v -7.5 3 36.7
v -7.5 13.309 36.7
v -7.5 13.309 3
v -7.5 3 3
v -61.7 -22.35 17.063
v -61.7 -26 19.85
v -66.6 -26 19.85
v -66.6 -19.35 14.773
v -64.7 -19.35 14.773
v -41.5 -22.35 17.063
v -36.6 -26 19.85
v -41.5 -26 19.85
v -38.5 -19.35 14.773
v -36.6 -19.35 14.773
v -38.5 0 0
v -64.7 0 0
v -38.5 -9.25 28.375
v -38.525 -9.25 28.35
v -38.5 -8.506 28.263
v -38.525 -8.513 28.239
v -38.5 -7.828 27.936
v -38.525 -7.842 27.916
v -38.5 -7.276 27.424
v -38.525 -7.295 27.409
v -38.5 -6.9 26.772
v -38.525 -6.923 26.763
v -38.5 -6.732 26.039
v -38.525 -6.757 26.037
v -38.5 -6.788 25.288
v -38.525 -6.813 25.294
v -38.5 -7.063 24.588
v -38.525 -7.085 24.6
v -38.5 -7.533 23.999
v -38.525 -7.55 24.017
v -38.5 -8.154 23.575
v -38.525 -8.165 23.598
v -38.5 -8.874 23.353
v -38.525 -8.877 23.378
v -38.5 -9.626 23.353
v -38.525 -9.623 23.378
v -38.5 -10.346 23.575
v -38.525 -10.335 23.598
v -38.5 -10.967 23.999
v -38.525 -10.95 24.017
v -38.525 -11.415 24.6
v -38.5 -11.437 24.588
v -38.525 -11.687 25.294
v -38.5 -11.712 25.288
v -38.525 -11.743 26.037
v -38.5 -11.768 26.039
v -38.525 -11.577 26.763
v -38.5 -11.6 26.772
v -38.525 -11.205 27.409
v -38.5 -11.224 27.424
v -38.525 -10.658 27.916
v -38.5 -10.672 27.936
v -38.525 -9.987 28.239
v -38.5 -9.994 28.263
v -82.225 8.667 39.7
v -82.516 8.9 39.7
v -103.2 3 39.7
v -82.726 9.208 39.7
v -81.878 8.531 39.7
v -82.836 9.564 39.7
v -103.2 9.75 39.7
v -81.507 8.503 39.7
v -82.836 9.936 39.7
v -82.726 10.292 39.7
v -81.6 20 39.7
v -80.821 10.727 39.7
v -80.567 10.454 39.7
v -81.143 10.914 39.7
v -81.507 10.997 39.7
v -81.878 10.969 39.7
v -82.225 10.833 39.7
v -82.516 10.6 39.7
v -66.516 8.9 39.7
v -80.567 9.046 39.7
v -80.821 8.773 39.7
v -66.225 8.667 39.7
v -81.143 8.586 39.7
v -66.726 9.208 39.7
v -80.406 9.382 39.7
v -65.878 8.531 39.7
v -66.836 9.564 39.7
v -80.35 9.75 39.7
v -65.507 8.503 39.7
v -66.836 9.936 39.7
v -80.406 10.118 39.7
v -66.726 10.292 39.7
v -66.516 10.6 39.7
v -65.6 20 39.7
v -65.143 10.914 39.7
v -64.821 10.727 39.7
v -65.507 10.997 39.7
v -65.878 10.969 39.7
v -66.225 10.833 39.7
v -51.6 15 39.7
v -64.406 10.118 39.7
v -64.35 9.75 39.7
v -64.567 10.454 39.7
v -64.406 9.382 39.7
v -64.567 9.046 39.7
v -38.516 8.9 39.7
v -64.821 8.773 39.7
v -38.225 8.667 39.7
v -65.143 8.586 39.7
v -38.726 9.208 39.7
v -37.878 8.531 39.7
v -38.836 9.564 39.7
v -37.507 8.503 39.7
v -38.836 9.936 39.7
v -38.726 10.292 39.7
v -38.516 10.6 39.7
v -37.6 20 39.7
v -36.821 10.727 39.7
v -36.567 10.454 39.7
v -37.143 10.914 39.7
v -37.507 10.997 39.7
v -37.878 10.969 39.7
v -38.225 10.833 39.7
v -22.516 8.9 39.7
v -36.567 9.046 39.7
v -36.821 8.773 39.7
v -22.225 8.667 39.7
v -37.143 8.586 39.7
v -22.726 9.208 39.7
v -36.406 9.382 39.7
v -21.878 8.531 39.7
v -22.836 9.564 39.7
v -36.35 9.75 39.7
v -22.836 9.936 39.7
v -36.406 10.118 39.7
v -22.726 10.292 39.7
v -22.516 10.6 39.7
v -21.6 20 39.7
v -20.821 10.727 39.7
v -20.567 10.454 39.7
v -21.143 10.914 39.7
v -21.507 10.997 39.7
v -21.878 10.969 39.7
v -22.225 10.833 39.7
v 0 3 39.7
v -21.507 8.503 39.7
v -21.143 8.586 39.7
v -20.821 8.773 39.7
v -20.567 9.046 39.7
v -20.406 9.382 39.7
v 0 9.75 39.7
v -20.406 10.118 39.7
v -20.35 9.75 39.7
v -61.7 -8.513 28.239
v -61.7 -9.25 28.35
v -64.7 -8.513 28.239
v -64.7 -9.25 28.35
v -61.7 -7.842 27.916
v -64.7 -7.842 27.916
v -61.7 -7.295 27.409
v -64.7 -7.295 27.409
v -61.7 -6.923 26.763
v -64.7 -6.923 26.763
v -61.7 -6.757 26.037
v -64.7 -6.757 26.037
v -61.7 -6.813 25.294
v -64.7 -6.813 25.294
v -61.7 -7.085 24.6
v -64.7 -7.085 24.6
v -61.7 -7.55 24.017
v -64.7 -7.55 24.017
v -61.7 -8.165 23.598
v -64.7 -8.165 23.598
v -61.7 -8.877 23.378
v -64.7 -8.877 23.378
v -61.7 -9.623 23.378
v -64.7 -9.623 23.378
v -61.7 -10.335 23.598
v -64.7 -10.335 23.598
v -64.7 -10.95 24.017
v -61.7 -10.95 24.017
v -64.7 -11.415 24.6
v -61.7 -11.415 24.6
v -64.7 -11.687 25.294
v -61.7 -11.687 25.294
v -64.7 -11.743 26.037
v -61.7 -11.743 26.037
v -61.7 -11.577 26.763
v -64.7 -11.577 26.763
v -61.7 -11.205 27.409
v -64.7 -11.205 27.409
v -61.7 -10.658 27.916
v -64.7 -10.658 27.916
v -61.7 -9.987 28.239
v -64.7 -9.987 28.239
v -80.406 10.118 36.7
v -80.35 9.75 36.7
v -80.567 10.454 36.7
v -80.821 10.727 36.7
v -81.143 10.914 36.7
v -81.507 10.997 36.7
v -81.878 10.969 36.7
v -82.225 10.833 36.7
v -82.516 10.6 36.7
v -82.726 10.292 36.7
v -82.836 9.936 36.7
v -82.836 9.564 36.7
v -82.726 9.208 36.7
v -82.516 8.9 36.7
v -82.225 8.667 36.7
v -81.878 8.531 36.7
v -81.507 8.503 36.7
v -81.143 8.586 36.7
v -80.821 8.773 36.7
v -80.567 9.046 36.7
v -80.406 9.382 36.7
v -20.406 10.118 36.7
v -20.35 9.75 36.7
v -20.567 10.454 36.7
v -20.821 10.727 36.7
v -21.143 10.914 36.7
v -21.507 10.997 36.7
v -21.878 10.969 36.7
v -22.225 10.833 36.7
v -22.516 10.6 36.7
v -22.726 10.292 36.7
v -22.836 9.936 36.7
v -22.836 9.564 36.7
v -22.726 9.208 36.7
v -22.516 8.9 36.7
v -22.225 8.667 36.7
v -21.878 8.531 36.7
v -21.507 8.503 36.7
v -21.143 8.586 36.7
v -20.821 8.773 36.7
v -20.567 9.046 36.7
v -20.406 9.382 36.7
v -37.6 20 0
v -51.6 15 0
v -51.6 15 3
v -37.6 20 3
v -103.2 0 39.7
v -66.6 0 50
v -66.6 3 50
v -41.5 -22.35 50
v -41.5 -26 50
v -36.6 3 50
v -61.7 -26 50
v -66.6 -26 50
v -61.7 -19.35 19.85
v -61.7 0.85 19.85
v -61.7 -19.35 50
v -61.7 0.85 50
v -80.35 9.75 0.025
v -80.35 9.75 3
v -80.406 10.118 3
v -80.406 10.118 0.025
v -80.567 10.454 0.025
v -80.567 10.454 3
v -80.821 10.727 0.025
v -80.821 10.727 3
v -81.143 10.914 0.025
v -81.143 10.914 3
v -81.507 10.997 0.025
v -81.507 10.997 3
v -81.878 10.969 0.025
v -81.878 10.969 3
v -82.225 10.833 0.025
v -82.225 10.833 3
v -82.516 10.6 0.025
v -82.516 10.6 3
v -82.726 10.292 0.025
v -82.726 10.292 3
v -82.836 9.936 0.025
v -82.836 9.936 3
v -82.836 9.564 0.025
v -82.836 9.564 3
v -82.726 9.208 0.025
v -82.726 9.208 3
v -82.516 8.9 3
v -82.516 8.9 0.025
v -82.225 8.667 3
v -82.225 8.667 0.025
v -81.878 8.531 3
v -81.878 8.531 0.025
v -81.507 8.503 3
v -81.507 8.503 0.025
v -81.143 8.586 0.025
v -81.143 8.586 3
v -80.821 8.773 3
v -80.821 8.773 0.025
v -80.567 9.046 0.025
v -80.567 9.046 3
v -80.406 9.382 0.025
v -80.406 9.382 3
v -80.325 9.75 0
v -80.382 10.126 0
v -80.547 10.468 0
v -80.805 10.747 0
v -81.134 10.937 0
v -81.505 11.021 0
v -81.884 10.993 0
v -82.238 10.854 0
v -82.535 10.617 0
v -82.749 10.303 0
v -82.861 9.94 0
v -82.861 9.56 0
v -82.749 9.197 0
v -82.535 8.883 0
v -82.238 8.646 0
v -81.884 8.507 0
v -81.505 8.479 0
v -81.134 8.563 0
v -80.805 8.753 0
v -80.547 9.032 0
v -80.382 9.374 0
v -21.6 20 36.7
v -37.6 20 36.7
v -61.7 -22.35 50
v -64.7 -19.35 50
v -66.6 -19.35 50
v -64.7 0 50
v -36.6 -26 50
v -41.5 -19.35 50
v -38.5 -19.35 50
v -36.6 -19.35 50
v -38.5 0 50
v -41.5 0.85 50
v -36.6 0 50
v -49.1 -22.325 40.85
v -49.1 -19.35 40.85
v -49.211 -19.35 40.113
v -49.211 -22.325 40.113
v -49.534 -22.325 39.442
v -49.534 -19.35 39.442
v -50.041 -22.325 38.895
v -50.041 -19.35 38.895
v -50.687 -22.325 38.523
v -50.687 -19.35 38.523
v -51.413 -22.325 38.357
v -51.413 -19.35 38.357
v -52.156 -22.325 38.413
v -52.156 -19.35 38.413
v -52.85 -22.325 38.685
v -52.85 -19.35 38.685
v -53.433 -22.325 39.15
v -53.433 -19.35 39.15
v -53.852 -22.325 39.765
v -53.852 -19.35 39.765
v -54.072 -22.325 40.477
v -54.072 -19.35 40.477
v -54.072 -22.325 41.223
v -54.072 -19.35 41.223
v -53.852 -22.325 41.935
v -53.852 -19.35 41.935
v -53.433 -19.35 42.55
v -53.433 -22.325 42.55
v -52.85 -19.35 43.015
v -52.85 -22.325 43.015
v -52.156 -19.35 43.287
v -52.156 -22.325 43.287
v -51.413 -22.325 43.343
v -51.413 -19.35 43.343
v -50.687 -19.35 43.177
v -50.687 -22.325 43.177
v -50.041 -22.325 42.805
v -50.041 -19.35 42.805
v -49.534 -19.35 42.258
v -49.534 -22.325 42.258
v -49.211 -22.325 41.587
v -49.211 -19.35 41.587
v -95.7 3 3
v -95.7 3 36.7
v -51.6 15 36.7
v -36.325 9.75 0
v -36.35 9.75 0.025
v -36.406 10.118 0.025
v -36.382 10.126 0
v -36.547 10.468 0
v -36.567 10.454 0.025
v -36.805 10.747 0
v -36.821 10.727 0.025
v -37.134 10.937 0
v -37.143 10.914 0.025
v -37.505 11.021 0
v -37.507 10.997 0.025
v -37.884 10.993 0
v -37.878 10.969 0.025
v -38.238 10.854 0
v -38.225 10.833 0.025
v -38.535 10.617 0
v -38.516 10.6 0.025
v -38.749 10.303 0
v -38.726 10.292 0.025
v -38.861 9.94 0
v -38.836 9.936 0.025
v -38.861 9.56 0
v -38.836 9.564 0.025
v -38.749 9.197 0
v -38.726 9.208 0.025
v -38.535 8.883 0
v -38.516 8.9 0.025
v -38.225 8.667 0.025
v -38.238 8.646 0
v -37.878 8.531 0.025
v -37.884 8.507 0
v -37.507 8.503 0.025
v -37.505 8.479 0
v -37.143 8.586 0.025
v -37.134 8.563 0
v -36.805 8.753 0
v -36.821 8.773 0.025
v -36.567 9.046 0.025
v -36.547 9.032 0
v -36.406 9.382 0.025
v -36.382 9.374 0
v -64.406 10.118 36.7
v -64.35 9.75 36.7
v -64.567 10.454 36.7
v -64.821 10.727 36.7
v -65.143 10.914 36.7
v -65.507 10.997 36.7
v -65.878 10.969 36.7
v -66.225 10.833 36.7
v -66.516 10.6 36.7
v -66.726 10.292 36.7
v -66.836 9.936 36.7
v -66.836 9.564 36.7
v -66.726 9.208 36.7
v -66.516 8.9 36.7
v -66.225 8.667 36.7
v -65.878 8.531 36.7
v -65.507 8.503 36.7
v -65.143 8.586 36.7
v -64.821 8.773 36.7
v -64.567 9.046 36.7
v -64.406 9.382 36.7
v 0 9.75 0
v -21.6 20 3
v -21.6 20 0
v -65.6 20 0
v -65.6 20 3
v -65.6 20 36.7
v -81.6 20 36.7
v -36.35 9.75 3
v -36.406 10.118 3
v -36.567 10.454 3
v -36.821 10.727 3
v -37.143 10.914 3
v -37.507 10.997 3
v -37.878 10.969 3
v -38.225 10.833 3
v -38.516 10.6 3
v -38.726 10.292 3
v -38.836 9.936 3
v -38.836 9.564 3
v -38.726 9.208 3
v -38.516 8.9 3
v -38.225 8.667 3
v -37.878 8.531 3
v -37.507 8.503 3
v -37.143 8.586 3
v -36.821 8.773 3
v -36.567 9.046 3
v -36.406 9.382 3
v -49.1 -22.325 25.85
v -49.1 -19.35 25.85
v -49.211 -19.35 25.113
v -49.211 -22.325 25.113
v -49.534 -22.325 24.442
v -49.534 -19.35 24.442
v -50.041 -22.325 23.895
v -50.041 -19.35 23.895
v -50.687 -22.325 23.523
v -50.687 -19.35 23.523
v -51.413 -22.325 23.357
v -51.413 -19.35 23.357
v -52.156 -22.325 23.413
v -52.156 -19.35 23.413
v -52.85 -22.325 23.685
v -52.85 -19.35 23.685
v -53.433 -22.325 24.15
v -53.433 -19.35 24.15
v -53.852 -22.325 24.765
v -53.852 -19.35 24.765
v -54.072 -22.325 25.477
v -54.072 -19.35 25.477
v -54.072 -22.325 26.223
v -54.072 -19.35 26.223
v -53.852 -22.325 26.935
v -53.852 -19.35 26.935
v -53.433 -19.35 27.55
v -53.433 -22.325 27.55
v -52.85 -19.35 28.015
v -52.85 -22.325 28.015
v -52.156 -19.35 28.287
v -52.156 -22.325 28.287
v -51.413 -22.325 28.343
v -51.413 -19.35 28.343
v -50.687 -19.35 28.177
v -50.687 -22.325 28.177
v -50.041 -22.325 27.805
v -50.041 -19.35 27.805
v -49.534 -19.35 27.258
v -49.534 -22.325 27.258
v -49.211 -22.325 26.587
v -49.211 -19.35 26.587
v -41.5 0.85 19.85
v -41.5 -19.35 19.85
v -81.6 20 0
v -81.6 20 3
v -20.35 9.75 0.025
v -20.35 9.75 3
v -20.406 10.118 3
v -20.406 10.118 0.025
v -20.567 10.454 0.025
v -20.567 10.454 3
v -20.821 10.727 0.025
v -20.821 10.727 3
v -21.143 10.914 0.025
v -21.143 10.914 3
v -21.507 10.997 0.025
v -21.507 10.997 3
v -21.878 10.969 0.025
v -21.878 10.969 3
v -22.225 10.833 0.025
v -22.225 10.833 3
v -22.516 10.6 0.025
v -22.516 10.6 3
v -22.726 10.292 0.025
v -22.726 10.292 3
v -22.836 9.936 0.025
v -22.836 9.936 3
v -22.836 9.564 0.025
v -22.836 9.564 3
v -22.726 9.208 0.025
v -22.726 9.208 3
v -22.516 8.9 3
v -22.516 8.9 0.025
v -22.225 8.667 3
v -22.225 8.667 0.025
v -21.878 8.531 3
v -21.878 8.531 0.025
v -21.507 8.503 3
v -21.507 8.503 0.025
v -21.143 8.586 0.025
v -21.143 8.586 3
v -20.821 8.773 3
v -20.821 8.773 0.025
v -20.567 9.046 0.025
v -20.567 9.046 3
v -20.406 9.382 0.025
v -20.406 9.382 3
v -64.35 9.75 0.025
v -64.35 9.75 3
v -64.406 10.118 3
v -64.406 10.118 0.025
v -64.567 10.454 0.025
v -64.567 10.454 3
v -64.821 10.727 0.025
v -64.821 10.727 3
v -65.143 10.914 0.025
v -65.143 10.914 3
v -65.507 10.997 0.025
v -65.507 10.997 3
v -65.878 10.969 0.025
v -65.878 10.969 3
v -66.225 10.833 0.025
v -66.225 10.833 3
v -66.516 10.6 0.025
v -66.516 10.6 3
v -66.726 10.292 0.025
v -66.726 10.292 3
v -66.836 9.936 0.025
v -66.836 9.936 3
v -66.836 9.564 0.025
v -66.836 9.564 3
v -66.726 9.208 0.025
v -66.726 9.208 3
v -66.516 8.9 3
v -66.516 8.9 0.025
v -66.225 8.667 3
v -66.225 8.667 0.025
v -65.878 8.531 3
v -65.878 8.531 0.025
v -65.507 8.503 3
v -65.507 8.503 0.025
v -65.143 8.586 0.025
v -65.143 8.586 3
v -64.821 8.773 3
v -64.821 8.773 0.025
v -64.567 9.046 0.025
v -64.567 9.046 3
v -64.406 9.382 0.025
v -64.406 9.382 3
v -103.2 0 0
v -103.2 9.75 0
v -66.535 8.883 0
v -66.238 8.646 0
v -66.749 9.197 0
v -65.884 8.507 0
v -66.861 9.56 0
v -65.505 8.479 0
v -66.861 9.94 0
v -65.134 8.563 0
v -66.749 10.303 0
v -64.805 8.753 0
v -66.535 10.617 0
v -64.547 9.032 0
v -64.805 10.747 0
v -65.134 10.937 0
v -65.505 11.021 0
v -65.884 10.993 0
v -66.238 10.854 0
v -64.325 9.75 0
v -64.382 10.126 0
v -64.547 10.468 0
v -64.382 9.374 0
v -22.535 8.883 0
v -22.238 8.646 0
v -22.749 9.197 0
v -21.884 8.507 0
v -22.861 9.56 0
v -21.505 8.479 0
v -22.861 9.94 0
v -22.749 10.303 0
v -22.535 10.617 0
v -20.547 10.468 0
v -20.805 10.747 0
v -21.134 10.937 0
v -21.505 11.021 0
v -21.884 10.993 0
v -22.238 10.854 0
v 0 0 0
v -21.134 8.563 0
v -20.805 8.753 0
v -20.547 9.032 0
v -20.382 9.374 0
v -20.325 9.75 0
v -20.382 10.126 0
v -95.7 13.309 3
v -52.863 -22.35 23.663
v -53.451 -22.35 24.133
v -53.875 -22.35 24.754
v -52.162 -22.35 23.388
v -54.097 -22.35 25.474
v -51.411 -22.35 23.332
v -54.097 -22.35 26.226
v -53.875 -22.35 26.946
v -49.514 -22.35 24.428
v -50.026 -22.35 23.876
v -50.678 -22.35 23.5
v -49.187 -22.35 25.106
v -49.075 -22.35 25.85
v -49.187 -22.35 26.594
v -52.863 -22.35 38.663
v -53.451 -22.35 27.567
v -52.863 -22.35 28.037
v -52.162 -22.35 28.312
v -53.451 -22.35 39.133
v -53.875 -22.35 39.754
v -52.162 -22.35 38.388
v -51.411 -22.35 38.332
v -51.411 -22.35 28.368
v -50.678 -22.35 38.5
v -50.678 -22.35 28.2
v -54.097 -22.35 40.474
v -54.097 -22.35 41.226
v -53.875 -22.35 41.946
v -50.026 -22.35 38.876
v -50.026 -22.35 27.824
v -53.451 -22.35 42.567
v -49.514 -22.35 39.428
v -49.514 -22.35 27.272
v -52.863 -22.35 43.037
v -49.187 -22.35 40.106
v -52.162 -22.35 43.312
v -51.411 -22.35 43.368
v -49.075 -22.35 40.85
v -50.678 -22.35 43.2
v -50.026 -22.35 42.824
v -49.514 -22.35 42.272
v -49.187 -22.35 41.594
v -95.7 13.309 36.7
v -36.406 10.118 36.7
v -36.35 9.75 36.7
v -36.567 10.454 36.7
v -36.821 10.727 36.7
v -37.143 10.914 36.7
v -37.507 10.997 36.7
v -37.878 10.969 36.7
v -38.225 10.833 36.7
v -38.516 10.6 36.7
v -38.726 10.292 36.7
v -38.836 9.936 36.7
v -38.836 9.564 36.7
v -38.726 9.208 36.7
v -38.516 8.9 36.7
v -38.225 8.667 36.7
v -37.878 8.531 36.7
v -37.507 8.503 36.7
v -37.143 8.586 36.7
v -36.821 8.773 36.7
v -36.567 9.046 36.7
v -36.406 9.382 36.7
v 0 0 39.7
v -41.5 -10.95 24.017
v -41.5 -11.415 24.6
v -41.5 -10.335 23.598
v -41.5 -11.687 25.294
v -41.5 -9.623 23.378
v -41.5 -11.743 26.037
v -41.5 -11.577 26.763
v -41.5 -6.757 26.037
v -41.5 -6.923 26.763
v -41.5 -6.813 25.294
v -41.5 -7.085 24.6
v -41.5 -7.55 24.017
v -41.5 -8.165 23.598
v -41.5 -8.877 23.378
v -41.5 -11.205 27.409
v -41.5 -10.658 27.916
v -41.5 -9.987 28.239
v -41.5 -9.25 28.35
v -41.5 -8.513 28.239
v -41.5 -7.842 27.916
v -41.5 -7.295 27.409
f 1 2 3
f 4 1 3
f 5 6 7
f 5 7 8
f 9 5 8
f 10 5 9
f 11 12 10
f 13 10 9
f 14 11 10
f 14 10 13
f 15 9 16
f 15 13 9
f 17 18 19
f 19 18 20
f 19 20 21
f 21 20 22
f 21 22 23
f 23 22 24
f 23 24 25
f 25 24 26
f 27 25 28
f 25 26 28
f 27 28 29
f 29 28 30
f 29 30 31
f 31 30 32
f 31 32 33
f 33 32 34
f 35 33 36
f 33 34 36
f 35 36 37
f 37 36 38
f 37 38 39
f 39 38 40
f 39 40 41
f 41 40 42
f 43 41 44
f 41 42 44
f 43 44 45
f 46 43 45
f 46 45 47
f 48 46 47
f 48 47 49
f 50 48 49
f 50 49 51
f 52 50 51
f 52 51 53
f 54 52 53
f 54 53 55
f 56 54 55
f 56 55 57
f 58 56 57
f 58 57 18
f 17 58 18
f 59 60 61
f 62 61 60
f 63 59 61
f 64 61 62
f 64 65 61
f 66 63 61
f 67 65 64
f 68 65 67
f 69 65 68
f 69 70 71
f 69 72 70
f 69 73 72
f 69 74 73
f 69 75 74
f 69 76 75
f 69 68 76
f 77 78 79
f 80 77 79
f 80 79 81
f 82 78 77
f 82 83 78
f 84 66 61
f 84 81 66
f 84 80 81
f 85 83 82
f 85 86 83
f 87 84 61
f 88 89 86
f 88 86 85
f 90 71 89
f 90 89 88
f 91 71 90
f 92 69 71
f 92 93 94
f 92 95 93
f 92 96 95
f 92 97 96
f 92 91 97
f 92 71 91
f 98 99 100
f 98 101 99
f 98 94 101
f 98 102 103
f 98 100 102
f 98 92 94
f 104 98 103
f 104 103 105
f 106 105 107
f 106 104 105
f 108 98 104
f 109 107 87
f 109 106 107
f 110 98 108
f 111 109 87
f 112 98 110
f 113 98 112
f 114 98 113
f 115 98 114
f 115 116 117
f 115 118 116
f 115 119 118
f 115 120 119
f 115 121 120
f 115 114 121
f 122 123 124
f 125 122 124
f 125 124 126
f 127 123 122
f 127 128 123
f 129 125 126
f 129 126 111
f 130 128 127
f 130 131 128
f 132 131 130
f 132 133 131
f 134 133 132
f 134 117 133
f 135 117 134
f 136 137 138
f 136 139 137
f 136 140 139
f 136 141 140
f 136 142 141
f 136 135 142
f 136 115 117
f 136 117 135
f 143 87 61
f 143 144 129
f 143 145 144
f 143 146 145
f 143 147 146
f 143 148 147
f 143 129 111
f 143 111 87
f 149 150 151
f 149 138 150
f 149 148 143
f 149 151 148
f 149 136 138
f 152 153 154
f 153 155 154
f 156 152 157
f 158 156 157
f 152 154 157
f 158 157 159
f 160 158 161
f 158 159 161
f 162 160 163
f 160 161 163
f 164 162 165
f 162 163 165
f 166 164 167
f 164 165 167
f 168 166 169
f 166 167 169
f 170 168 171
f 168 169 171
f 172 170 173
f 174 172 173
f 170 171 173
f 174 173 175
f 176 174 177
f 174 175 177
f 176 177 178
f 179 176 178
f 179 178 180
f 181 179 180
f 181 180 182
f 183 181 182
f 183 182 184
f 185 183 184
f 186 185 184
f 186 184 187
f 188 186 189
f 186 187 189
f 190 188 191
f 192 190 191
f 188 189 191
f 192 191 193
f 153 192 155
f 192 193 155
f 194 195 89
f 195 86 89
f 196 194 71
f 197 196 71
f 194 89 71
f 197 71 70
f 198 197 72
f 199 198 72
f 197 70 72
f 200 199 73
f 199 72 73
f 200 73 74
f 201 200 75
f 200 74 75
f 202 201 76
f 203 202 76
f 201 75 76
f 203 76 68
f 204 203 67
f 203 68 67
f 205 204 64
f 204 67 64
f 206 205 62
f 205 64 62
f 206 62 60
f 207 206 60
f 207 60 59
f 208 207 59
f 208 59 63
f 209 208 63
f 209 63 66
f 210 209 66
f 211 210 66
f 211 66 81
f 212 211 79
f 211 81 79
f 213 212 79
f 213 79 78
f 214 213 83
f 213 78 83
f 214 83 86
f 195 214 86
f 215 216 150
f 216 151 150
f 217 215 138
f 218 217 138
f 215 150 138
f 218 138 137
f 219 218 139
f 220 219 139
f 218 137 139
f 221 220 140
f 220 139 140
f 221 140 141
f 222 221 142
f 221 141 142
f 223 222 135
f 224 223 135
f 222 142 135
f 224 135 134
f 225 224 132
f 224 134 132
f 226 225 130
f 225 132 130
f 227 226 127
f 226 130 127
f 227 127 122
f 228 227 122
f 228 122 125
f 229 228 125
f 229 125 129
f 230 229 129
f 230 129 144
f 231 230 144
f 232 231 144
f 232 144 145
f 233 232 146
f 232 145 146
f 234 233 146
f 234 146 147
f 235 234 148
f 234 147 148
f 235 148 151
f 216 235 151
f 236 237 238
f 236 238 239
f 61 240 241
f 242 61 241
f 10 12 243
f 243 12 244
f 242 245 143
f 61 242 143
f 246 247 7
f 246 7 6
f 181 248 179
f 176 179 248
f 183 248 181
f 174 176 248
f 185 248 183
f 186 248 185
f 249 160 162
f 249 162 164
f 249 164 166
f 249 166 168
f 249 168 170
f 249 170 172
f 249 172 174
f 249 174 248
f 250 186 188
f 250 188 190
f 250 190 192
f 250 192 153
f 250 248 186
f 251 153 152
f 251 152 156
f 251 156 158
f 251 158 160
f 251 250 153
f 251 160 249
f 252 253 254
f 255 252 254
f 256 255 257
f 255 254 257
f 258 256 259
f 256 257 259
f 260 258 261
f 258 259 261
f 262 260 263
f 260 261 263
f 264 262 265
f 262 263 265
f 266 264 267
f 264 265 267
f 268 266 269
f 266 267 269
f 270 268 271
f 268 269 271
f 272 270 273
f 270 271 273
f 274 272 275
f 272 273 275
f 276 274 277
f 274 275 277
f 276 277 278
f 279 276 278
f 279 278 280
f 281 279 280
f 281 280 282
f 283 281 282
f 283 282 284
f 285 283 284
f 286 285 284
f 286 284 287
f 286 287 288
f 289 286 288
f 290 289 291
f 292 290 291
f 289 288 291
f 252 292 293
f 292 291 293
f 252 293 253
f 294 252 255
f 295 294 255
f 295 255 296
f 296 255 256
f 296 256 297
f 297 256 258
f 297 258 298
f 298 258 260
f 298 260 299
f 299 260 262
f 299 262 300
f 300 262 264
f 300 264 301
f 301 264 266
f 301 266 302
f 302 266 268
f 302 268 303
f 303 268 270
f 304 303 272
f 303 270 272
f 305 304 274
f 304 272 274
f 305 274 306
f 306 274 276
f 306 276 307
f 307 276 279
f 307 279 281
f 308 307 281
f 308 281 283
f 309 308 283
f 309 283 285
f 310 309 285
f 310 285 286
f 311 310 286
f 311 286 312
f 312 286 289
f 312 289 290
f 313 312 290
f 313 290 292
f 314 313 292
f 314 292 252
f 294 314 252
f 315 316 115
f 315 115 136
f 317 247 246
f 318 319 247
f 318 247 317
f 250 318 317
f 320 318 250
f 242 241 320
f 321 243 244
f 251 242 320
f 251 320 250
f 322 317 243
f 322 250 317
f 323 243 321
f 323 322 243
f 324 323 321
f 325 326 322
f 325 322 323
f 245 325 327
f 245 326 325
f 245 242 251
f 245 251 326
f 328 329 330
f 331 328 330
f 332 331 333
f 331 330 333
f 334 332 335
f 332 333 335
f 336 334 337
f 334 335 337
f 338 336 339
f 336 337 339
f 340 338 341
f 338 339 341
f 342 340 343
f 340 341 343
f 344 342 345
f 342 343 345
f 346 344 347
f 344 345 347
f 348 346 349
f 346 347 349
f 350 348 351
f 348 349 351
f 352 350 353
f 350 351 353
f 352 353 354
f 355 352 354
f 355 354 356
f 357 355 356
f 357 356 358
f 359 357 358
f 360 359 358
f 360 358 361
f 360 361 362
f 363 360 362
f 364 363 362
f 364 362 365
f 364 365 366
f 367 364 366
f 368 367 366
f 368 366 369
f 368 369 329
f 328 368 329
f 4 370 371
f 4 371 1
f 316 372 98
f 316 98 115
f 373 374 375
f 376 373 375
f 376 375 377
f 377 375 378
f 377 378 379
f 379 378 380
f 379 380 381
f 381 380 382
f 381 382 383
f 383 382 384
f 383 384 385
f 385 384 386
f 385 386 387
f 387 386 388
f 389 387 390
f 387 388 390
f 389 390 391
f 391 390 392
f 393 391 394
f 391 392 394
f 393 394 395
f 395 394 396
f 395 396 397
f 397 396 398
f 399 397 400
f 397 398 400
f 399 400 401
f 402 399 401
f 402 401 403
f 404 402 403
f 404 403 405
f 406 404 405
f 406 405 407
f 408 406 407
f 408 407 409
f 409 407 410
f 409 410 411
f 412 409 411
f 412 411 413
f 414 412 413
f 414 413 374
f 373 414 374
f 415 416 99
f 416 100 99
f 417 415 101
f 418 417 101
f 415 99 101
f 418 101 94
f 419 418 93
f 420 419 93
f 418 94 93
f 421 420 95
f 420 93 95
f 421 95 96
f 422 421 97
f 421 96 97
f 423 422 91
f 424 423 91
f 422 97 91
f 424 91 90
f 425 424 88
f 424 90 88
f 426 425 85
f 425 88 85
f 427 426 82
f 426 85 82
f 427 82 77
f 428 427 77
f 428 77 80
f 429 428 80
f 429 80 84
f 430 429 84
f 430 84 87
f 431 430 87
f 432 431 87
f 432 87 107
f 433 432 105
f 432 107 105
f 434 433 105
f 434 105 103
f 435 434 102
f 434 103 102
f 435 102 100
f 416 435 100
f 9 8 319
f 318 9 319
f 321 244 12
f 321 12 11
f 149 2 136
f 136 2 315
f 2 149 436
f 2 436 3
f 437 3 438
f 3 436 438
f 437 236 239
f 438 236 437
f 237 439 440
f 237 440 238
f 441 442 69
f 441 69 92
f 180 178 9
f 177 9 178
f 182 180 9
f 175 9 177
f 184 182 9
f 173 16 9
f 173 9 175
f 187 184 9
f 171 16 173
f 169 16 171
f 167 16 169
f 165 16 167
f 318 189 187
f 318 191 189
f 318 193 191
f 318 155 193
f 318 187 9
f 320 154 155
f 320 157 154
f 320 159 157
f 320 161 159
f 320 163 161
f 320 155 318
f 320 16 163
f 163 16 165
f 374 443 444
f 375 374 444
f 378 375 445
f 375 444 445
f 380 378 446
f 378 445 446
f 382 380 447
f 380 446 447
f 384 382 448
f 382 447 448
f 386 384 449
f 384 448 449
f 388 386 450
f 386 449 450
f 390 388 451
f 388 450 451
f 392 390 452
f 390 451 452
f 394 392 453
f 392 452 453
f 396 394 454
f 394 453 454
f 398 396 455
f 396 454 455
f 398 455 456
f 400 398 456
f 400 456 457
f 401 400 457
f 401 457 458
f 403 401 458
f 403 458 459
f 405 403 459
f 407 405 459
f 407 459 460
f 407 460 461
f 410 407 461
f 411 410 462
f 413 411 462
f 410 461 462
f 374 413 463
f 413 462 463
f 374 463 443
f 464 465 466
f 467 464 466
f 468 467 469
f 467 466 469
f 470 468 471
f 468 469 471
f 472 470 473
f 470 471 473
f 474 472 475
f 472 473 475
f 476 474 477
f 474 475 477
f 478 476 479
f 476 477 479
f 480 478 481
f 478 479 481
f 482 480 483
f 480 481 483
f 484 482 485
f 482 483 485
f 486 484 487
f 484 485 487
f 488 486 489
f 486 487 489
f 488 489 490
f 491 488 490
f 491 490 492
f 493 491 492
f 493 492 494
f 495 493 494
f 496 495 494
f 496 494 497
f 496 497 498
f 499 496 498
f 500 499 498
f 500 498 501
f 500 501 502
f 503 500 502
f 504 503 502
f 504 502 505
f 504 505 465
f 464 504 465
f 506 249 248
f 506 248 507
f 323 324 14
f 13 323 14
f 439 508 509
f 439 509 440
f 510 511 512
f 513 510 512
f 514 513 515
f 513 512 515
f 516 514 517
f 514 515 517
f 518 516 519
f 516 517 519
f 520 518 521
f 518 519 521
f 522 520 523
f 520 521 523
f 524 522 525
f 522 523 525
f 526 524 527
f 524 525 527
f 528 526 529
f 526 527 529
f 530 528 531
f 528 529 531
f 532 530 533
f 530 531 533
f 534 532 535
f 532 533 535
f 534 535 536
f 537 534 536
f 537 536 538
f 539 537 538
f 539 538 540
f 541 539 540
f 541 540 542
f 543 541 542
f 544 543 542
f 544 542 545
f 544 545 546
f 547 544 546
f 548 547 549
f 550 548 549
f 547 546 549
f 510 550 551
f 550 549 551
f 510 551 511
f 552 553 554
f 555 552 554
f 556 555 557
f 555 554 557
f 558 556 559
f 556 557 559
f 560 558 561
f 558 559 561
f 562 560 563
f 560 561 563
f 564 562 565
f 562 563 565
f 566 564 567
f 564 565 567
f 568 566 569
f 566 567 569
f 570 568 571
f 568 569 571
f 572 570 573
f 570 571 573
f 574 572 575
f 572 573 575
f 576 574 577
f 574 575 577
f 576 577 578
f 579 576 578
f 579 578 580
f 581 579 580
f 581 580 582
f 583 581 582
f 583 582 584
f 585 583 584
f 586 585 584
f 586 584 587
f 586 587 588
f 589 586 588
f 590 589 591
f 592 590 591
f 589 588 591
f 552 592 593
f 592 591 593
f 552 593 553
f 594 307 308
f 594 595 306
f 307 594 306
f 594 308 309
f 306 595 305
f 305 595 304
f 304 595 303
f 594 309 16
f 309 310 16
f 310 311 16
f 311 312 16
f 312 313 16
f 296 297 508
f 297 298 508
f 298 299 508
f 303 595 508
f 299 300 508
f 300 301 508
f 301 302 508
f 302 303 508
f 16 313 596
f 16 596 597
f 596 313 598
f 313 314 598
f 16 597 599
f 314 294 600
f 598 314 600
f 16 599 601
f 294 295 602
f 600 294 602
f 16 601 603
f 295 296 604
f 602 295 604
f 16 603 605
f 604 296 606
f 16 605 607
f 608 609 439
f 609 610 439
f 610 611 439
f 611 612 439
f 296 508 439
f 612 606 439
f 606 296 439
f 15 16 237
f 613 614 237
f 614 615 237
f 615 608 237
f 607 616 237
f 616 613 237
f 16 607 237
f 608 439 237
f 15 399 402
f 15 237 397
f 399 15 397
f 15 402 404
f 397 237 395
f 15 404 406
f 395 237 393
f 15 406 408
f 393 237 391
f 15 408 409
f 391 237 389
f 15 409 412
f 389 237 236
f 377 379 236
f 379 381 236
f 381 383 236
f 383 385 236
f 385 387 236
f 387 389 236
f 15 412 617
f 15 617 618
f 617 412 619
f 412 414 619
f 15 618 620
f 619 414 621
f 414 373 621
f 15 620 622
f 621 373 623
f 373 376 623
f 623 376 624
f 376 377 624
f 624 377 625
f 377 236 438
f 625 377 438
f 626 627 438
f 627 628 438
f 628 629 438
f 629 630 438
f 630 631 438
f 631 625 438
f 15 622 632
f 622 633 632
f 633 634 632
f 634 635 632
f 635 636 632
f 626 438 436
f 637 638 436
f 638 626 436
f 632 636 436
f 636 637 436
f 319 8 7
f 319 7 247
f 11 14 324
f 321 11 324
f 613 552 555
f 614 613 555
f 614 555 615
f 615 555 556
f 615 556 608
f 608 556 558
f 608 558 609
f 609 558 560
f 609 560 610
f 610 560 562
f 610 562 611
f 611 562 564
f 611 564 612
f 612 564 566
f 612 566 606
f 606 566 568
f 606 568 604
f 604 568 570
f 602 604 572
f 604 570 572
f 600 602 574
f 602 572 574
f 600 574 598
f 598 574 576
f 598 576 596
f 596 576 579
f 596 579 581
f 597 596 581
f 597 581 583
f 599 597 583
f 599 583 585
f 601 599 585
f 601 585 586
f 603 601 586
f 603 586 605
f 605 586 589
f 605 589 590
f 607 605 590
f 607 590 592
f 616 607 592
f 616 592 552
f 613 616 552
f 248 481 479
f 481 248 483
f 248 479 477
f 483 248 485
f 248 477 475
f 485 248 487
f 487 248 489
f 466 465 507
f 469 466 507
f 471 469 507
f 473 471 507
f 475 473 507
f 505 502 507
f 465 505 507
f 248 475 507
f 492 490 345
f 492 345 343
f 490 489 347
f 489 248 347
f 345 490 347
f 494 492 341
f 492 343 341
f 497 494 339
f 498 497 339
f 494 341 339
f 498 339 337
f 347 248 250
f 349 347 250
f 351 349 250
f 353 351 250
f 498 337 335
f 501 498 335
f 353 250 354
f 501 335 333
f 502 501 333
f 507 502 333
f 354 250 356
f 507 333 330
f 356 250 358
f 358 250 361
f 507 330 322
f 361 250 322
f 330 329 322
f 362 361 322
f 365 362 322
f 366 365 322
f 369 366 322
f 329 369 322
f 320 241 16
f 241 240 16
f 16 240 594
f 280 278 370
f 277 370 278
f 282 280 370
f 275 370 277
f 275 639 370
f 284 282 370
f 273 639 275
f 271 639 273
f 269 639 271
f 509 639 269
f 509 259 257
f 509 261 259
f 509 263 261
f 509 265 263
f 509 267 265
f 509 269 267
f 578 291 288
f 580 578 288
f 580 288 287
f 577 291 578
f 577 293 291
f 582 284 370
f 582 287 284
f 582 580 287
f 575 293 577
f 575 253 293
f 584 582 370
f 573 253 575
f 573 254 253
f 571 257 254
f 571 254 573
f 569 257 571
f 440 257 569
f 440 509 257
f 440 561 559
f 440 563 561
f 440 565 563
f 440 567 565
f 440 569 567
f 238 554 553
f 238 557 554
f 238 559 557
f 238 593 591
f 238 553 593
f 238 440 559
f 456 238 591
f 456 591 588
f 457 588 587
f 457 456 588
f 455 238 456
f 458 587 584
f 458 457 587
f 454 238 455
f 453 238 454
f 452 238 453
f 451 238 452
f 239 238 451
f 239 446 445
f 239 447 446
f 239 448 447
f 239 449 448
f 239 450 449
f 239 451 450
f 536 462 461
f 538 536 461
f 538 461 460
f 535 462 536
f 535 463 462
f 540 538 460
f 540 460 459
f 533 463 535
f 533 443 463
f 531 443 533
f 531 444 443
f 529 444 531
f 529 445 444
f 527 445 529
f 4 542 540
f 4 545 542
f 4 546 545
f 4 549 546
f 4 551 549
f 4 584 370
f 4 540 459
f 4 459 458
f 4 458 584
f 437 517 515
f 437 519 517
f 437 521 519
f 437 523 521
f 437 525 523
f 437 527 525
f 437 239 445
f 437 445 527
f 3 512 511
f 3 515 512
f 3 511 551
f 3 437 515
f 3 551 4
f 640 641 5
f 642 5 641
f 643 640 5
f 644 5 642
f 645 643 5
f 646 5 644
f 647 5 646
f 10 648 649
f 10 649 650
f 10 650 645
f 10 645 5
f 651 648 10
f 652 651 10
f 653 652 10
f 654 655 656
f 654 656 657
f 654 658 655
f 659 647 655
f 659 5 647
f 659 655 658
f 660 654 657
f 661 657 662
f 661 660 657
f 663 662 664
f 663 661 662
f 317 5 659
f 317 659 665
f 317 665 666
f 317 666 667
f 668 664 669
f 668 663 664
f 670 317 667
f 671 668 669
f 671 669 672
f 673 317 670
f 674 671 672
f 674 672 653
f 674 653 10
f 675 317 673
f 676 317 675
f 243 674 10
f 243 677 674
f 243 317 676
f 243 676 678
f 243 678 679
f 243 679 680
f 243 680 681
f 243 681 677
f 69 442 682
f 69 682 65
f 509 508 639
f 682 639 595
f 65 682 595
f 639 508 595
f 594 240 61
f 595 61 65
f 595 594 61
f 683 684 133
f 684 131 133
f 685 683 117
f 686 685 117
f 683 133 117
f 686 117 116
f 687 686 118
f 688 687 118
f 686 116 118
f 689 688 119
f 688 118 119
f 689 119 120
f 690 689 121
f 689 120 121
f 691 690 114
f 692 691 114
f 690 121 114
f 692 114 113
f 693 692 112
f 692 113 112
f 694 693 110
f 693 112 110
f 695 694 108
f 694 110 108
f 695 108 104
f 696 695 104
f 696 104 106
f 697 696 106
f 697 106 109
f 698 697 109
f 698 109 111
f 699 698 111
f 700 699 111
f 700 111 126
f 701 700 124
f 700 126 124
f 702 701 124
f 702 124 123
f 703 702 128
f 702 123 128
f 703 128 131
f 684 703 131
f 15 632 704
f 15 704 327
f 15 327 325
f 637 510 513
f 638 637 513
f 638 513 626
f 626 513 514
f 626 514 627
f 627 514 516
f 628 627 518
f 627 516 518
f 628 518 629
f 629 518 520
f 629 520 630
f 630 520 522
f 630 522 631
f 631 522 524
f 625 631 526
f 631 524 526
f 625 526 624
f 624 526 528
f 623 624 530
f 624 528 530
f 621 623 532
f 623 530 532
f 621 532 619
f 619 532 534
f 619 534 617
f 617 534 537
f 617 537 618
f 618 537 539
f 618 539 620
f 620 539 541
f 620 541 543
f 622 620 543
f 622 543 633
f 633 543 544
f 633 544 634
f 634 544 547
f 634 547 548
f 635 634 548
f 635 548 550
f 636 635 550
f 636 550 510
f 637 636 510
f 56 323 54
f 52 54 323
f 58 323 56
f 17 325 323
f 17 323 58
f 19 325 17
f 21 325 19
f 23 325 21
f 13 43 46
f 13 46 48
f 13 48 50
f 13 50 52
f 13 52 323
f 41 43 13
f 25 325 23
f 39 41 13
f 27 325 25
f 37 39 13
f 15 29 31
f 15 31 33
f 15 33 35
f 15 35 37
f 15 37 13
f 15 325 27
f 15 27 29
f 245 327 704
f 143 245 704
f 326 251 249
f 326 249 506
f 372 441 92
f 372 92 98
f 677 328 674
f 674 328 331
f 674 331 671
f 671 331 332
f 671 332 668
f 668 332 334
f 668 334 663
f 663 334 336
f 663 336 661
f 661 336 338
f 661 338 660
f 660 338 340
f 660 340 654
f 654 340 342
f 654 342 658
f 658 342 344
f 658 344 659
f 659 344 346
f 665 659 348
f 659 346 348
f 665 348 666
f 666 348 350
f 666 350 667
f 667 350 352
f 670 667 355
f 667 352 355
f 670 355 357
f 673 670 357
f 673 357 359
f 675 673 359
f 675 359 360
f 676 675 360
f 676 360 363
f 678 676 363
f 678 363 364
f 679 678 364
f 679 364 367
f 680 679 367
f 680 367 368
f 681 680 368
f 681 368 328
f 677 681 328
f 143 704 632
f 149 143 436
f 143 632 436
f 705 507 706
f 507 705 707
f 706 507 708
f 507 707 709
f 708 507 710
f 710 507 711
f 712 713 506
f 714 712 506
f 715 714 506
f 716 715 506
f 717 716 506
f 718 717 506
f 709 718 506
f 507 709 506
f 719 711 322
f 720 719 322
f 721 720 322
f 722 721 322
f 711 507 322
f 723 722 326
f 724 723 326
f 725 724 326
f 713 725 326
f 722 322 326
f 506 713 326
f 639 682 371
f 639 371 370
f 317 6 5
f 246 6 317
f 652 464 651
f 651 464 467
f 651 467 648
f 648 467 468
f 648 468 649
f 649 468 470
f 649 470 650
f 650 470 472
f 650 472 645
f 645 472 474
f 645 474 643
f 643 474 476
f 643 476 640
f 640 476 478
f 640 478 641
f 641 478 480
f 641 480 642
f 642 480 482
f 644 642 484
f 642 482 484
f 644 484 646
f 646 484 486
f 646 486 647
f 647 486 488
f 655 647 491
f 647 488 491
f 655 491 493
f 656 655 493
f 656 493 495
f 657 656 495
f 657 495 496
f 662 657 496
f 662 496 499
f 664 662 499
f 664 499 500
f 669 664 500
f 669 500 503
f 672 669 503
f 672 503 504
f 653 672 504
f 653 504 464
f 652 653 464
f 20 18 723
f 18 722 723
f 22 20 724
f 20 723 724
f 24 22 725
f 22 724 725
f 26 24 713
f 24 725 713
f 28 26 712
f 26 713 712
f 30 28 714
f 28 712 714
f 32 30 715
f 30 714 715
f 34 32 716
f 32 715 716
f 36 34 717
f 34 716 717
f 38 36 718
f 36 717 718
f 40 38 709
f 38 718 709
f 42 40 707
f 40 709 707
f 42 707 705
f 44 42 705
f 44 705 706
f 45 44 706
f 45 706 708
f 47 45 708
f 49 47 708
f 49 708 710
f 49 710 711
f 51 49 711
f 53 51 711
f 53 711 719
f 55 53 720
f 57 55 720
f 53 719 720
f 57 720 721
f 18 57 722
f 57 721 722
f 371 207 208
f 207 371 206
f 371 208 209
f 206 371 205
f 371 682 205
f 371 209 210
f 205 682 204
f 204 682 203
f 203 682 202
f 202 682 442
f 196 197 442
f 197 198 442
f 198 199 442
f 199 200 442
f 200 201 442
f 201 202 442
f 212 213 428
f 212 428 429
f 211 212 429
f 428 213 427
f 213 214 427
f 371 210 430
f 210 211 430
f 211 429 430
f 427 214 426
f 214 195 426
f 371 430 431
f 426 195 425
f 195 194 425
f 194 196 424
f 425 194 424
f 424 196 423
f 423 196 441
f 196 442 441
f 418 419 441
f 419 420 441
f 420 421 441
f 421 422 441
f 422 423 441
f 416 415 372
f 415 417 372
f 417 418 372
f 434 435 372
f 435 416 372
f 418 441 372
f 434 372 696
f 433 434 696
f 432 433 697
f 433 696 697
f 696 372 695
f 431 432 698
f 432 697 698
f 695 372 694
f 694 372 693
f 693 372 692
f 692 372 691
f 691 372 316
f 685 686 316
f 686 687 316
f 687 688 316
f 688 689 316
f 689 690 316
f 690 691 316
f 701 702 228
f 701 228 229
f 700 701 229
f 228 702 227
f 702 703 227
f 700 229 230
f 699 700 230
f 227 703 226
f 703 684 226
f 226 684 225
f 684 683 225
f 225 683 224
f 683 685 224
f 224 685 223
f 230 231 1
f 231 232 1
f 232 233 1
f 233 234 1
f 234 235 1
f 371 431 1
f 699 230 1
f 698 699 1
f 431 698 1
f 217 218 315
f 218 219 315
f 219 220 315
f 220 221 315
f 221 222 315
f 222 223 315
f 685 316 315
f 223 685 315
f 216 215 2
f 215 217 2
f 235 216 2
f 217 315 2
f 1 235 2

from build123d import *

# Parameters (mm, degrees)
SKETCH_1_W            = 103.2
SKETCH_1_H            = 20
EXTRUDE_1_DEPTH       = 39.7
SKETCH_2_W            = 88.2
SKETCH_2_H            = 33.7
CUT_EXTRUDE_1_DEPTH   = 17
EXTRUDE_START         = -3
SKETCH_3_W            = 30
SKETCH_3_H            = 50
EXTRUDE_2_DEPTH       = 29
SKETCH_21_W           = 20.2
SKETCH_21_H           = 20.2
CUT_EXTRUDE_11_DEPTH  = 30.15
SKETCH_22_W           = 20.2
SKETCH_22_H           = 50
CUT_EXTRUDE_12_DEPTH  = 3.65
CUT_EXTRUDE_14_DEPTH  = 88.244254825
EXTRUDE_4_DEPTH       = 3
F_2_5MM_2_D           = 2.5
F_2_5MM_2_CSINK_D     = 2.55
F_2_5MM_2_CSINK_ANGLE = 90
F_5_0MM_3_D           = 5
F_5_0MM_3_DEPTH       = 3
F_5_0MM_3_CSINK_D     = 5.05
F_5_0MM_3_CSINK_ANGLE = 90
SKETCH_30_W           = 52.520858891
SKETCH_30_H           = 19.35
CUT_EXTRUDE_15_DEPTH  = 1.9
CUT_EXTRUDE_16_DEPTH  = 1.9
F_5_0MM_4_D           = 5
F_5_0MM_4_CSINK_D     = 5.05
F_5_0MM_4_CSINK_ANGLE = 90
CUT_EXTRUDE_19_DEPTH  = 118.585033061
F_2_5MM_1_D           = 2.5
F_2_5MM_1_CSINK_D     = 2.55
F_2_5MM_1_CSINK_ANGLE = 90


with BuildPart() as part:
    # 草图1 → 凸台-拉伸1 (new body)
    with BuildSketch(Plane.XY):
        with Locations((-51.6, 10)):
            Rectangle(SKETCH_1_W, SKETCH_1_H)
    extrude(amount=EXTRUDE_1_DEPTH)

    # 草图2 → 切除-拉伸1 (cut)
    with BuildSketch(Plane(origin=(0, 20, 0), x_dir=(1, 0, 0), z_dir=(0, 1, 0))):
        with Locations((-51.6, -19.85)):
            Rectangle(SKETCH_2_W, SKETCH_2_H)
    extrude(amount=-CUT_EXTRUDE_1_DEPTH, mode=Mode.SUBTRACT)

    # 草图3 → 凸台-拉伸2 (add)
    with BuildSketch(Plane.XZ.offset(EXTRUDE_START)):
        with Locations((-51.6, 25)):
            Rectangle(SKETCH_3_W, SKETCH_3_H)
    extrude(amount=EXTRUDE_2_DEPTH)

    # 草图21 → 切除-拉伸11 (cut)
    with BuildSketch(Plane.XY.offset(50)):
        with Locations((-51.6, -9.25)):
            Rectangle(SKETCH_21_W, SKETCH_21_H)
    extrude(amount=-CUT_EXTRUDE_11_DEPTH, mode=Mode.SUBTRACT)

    # 草图22 → 切除-拉伸12 (cut)
    with BuildSketch(Plane.XZ.offset(26)):
        with Locations((-51.6, 25)):
            Rectangle(SKETCH_22_W, SKETCH_22_H)
    extrude(amount=-CUT_EXTRUDE_12_DEPTH, mode=Mode.SUBTRACT)

    # 草图24 → 切除-拉伸14 (cut, through all)
    with BuildSketch(Plane(origin=(-36.6, 0, 0), x_dir=(0, 0, -1), z_dir=(1, 0, 0))):
        Polygon((0, 0), (0, -26), (-19.85, -26), align=None)
    extrude(amount=-CUT_EXTRUDE_14_DEPTH, mode=Mode.SUBTRACT)

    # 草图25 → 凸台-拉伸4 (add)
    with BuildSketch(Plane.XZ):
        Polygon((-36.6, 39.7), (-36.6, 50), (0, 39.7), align=None)
        Polygon((-66.6, 39.7), (-103.2, 39.7), (-66.6, 50), align=None)
    extrude(amount=-EXTRUDE_4_DEPTH)

    # Ø2.5mm 暗销孔2 (through all)
    with Locations(Plane(origin=(0, 0, 0), x_dir=(-1, 0, 0), z_dir=(0, 0, -1))):
        with Locations((81.6, 9.75), (37.6, 9.75), (21.6, 9.75), (65.6, 9.75)):
            CounterSinkHole(F_2_5MM_2_D / 2, F_2_5MM_2_CSINK_D / 2, counter_sink_angle=F_2_5MM_2_CSINK_ANGLE)

    # Ø5.0mm 暗销孔3
    with Locations(Plane(origin=(0, -22.35, 0), x_dir=(-1, 0, 0), z_dir=(0, -1, 0))):
        with Locations((51.6, -40.85), (51.6, -25.85)):
            CounterSinkHole(F_5_0MM_3_D / 2, F_5_0MM_3_CSINK_D / 2, depth=F_5_0MM_3_DEPTH, counter_sink_angle=F_5_0MM_3_CSINK_ANGLE)

    # 草图30 → 切除-拉伸15 (cut)
    with BuildSketch(Plane(origin=(-36.6, 0, 0), x_dir=(0, 0, -1), z_dir=(1, 0, 0))):
        with Locations((-23.739570554, -9.675)):
            Rectangle(SKETCH_30_W, SKETCH_30_H)
    extrude(amount=-CUT_EXTRUDE_15_DEPTH, mode=Mode.SUBTRACT)

    # 草图31 → 切除-拉伸16 (cut)
    with BuildSketch(Plane.ZY.offset(66.6)):
        Polygon((0, 0), (14.772980769, -19.35), (50, -19.35), (50, 0), align=None)
    extrude(amount=-CUT_EXTRUDE_16_DEPTH, mode=Mode.SUBTRACT)

    # Ø5.0mm 暗销孔4 (through all)
    with Locations(Plane(origin=(-38.5, 0, 0), x_dir=(0, 0, -1), z_dir=(1, 0, 0))):
        with Locations((-25.85, -9.25)):
            CounterSinkHole(F_5_0MM_4_D / 2, F_5_0MM_4_CSINK_D / 2, counter_sink_angle=F_5_0MM_4_CSINK_ANGLE)

    # 草图35 → 切除-拉伸19 (cut, through all)
    with BuildSketch(Plane(origin=(0, 0, 0), x_dir=(-1, 0, 0), z_dir=(0, 0, -1))):
        Polygon((103.2, 20), (81.6, 20), (103.2, 9.75), align=None)
        Polygon((0, 20), (0, 9.75), (21.6, 20), align=None)
        Polygon((65.6, 20), (51.6, 15), (37.6, 20), align=None)
    extrude(amount=-CUT_EXTRUDE_19_DEPTH, mode=Mode.SUBTRACT)

    # Ø2.5mm 暗销孔1 (through all)
    with Locations(Plane(origin=(0, 0, 0), x_dir=(-1, 0, 0), z_dir=(0, 0, -1))):
        with Locations((81.6, 9.75), (37.6, 9.75), (21.6, 9.75), (65.6, 9.75)):
            CounterSinkHole(F_2_5MM_1_D / 2, F_2_5MM_1_CSINK_D / 2, counter_sink_angle=F_2_5MM_1_CSINK_ANGLE)


solid = part.part
